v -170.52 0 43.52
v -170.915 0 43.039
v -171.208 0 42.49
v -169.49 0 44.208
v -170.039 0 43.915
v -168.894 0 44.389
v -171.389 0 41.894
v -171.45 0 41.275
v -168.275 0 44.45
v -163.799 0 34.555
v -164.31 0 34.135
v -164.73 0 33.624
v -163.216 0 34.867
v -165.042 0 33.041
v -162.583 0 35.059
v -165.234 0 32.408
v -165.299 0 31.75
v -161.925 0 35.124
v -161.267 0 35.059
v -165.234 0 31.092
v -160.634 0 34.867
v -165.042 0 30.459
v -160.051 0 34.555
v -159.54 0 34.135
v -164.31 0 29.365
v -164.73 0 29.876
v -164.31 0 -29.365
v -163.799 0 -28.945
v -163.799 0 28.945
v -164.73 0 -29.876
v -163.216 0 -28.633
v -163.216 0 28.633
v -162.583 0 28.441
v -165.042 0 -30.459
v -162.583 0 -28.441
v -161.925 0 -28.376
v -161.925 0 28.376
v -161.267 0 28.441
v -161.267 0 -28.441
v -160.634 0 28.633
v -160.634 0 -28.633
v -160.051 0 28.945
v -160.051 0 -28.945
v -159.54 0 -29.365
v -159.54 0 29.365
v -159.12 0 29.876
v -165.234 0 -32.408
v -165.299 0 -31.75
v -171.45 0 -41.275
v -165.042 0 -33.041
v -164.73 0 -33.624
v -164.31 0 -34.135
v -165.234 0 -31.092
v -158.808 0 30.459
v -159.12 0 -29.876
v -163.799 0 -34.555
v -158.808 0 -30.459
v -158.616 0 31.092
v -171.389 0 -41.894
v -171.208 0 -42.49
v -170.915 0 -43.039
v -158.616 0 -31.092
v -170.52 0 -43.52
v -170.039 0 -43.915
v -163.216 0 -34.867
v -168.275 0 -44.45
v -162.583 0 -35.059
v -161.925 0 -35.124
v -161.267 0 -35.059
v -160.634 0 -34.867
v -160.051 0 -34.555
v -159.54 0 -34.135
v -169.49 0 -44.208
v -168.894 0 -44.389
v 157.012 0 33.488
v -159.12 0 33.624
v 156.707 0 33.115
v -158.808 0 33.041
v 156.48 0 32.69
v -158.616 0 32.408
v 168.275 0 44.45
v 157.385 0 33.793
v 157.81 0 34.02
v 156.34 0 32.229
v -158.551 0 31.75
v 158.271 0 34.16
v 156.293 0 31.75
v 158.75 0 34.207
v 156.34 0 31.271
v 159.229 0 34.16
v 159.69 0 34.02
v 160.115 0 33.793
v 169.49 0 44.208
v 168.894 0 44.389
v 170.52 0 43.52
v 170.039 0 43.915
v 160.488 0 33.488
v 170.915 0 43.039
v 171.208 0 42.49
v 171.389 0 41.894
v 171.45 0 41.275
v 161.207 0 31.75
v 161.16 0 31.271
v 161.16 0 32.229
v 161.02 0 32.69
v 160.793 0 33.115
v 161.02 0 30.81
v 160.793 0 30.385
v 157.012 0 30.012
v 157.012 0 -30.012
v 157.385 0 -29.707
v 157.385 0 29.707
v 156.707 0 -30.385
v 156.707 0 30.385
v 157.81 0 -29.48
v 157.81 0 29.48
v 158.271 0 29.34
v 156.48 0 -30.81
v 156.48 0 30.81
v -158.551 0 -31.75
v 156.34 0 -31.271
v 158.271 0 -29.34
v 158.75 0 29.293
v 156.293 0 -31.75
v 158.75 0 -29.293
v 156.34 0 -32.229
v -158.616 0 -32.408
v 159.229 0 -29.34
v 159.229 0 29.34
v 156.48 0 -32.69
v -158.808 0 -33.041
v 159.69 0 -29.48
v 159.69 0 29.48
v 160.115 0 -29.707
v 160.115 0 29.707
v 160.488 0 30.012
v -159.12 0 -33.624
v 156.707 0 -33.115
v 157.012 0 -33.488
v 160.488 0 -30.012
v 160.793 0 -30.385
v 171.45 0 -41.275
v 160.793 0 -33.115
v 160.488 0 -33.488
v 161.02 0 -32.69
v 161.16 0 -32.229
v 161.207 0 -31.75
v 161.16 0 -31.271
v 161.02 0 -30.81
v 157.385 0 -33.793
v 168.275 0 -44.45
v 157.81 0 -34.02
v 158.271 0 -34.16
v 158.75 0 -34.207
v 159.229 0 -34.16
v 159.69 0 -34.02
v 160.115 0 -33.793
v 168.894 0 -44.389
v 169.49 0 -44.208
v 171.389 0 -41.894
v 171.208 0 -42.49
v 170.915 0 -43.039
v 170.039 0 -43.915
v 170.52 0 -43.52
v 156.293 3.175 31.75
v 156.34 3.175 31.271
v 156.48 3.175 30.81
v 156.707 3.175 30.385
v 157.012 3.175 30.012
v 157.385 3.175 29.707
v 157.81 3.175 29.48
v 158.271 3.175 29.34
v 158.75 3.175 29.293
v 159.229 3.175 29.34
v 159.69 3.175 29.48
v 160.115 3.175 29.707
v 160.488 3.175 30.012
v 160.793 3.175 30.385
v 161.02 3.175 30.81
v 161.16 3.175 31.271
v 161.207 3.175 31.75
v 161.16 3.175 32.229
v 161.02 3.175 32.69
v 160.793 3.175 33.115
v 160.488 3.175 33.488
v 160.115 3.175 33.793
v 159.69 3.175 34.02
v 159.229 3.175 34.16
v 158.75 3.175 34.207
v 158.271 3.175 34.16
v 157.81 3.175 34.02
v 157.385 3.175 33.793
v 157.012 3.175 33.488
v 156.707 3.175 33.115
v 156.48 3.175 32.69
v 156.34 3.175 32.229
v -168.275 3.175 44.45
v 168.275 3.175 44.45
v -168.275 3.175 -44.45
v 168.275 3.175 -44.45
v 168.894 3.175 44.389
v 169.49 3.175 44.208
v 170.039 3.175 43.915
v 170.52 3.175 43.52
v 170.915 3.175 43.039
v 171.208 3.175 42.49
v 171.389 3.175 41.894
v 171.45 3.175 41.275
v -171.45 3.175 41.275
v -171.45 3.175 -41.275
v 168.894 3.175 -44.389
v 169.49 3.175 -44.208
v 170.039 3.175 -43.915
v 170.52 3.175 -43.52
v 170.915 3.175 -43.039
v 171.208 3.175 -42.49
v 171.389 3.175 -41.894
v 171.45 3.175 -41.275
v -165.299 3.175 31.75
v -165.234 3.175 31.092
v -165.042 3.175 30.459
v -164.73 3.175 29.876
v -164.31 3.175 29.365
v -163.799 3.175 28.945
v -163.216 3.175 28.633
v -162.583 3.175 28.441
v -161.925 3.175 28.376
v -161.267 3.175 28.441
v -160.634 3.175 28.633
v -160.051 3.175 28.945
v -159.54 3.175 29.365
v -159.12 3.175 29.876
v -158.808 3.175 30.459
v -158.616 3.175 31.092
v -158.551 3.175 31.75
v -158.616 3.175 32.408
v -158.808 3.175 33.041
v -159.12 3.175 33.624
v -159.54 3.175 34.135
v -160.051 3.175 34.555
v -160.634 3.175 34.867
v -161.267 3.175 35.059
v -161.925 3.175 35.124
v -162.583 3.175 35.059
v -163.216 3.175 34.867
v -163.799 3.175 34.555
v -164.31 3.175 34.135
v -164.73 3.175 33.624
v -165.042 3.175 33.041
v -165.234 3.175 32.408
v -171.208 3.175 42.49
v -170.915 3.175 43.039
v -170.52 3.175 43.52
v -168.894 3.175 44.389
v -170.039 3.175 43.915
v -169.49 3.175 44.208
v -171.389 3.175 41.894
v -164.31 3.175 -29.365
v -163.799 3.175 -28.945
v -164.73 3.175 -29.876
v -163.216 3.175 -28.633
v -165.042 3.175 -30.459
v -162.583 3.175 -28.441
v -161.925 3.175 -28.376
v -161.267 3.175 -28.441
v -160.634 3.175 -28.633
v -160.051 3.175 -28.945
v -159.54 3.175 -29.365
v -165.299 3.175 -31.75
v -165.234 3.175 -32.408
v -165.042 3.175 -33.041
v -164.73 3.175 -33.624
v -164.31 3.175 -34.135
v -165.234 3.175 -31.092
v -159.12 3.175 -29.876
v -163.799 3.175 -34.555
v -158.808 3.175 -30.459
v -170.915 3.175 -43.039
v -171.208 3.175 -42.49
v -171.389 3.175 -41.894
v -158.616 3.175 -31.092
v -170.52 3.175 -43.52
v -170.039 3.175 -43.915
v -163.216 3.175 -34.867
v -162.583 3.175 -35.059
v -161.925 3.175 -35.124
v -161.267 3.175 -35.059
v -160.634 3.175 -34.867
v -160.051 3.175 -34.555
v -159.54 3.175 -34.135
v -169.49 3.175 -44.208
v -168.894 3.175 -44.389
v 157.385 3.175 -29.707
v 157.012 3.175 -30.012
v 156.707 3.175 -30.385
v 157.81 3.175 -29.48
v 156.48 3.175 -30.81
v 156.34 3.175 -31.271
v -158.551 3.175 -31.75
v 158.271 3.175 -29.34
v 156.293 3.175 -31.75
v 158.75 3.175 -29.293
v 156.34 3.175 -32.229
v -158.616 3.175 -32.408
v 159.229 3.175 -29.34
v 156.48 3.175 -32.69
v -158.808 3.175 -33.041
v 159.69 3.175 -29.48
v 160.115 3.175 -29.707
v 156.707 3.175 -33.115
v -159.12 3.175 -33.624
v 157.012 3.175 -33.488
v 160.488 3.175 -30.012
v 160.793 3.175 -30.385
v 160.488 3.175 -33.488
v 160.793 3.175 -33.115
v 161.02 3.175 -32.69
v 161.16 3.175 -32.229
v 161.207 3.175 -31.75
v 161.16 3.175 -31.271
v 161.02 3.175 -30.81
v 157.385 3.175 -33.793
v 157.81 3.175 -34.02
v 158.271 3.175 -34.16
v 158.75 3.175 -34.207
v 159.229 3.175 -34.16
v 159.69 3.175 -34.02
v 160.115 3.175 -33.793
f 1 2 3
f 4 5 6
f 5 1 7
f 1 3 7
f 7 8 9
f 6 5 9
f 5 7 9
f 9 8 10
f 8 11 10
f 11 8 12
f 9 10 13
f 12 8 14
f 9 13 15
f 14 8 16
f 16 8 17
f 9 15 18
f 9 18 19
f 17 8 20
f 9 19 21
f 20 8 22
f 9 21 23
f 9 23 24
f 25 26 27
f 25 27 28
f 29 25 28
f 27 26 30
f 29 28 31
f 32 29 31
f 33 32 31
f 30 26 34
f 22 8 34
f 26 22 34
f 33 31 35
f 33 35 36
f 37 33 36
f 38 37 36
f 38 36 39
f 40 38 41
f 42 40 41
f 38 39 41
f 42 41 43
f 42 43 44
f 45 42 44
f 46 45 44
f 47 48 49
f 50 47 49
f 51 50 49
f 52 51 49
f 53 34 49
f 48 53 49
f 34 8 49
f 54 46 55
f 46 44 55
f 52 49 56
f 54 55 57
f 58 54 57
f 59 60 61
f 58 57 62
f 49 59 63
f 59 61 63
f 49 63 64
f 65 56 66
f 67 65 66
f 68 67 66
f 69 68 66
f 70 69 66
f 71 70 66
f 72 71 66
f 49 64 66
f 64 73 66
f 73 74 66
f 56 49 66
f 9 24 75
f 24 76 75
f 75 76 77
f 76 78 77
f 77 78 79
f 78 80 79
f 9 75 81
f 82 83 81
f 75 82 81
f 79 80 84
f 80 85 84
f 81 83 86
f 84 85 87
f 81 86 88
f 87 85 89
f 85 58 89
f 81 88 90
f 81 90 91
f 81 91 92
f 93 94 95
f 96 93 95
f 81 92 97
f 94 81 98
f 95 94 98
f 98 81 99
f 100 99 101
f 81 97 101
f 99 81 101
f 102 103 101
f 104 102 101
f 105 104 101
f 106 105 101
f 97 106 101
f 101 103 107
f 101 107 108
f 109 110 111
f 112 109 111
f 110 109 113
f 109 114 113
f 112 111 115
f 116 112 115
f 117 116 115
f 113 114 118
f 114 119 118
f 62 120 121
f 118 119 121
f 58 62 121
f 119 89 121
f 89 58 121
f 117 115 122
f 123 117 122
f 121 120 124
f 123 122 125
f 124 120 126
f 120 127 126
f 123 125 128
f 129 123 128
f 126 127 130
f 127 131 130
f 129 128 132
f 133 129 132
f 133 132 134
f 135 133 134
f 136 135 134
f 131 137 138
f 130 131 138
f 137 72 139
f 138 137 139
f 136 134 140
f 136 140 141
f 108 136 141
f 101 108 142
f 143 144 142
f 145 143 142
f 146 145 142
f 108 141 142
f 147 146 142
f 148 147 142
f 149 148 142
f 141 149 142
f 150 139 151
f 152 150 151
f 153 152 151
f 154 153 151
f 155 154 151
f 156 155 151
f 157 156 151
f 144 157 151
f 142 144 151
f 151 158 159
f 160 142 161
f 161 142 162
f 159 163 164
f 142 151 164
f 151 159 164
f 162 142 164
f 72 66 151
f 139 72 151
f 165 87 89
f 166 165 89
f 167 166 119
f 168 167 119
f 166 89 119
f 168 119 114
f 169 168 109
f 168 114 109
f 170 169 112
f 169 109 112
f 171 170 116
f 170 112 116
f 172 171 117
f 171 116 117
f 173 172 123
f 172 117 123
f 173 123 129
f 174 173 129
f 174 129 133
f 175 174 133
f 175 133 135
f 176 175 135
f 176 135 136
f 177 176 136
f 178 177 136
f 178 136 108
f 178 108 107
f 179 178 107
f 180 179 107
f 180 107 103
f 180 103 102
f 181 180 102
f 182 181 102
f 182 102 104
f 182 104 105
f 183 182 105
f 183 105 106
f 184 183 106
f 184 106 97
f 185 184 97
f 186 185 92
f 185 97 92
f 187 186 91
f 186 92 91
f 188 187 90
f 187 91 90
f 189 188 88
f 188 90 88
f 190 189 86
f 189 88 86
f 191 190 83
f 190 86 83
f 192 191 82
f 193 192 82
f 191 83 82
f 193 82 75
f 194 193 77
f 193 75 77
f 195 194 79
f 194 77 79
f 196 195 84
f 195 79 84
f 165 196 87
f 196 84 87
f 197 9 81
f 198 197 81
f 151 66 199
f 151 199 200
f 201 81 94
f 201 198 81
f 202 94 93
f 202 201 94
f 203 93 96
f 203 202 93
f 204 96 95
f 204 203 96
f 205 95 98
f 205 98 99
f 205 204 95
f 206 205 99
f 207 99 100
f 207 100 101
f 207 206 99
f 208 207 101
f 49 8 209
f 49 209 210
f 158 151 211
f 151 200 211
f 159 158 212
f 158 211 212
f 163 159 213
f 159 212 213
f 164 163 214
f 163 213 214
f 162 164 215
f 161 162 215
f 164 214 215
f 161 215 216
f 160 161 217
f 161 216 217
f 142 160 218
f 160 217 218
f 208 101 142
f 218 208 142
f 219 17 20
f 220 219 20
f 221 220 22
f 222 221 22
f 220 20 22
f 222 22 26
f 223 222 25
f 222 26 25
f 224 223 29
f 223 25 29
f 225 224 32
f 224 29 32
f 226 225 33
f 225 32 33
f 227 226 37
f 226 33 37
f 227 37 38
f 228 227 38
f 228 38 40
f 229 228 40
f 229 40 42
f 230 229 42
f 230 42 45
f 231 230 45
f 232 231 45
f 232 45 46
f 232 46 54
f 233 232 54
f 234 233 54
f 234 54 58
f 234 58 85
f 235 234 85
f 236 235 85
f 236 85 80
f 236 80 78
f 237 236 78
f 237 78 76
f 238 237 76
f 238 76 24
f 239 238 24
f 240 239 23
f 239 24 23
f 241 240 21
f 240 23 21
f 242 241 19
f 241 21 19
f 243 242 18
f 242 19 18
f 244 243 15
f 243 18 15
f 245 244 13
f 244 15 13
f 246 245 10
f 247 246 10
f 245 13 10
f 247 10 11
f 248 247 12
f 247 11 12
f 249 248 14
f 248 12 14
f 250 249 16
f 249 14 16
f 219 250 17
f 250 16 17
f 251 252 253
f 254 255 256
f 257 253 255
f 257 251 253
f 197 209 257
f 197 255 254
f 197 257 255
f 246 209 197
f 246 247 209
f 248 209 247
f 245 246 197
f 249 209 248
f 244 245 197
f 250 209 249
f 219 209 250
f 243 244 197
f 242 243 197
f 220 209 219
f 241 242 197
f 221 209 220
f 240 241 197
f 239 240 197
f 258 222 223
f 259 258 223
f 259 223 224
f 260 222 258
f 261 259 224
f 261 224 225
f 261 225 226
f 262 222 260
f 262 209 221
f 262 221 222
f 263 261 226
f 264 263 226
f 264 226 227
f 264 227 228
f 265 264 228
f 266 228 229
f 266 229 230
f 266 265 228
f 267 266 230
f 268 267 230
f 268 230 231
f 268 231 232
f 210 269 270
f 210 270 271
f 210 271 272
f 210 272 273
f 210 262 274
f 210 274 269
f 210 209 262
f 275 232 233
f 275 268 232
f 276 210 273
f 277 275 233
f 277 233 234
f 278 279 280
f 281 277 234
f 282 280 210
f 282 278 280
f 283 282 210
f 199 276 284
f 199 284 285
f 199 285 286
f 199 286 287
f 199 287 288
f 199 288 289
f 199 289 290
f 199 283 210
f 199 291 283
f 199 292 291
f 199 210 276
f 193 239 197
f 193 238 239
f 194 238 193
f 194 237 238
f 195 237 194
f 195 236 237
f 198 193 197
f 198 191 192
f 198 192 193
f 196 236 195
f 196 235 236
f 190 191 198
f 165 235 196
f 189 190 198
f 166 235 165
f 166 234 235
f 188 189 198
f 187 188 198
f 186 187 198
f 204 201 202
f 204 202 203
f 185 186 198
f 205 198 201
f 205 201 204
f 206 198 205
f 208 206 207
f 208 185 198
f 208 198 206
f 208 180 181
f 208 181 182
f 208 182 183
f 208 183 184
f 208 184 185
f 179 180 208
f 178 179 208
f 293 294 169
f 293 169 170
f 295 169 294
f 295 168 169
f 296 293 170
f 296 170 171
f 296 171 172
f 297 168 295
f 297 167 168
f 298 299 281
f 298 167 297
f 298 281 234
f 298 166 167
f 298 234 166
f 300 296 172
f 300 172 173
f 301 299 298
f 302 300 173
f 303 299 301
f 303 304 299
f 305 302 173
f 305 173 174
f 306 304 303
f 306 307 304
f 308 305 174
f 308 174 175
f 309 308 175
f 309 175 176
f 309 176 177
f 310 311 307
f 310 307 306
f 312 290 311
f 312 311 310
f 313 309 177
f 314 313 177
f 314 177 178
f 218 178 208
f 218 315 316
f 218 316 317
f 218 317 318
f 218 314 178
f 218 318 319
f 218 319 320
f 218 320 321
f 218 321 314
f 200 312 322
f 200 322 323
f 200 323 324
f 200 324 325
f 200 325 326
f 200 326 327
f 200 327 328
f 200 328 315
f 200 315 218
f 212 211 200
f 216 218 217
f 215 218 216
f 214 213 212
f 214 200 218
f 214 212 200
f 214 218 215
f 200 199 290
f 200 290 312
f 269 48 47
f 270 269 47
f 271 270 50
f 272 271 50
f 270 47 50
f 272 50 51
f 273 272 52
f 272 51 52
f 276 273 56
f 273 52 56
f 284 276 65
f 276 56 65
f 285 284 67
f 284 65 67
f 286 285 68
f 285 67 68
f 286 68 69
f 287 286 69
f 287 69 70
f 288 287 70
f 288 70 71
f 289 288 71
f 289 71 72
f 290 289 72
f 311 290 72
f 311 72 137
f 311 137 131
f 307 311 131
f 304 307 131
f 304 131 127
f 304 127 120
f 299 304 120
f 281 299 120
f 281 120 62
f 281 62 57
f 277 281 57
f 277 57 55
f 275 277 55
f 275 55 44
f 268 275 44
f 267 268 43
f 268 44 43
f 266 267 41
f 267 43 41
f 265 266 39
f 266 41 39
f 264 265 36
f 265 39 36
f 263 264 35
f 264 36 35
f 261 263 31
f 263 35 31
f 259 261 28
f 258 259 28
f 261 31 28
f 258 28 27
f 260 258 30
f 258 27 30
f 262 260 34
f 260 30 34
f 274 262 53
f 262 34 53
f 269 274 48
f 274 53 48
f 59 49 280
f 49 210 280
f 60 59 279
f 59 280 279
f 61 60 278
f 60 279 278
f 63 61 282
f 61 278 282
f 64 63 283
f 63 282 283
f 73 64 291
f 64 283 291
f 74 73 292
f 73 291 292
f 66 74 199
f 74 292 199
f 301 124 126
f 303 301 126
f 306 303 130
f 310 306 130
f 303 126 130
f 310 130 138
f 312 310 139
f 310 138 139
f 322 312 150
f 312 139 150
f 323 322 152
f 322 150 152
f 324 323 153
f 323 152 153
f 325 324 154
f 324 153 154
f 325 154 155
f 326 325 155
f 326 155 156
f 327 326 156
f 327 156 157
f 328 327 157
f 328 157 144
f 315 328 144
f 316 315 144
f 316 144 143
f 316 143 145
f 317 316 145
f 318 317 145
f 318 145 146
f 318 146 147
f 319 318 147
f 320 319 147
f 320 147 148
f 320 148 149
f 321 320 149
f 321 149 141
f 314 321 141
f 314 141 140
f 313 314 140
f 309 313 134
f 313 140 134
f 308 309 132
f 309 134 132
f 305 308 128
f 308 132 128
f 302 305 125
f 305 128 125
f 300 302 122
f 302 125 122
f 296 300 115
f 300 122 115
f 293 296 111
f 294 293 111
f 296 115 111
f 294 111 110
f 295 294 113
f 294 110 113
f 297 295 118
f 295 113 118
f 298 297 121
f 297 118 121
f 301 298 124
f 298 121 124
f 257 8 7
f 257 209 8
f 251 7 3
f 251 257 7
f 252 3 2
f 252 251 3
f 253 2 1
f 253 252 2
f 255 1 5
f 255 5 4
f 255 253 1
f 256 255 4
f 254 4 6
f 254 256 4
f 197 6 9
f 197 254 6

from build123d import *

# Parameters (mm, degrees)
SKETCH1_W                        = 342.9
SKETCH1_H                        = 88.9
BOSS_EXTRUDE1_DEPTH              = 3.175
F_17_64_0_26563_DIAMETER_HOLE1_D = 6.747002
F_10_0_1935_DIAMETER_HOLE1_D     = 4.9149
FILLET1_R                        = 3.175


with BuildPart() as part:
    # Sketch1 → Boss-Extrude1 (new body)
    with BuildSketch(Plane(origin=(0, 0, 0), x_dir=(1, 0, 0), z_dir=(0, 1, 0))):
        Rectangle(SKETCH1_W, SKETCH1_H)
    extrude(amount=BOSS_EXTRUDE1_DEPTH)

    # 17/64 (0.26563) Diameter Hole1 (through all)
    with Locations(Plane(origin=(0, 3.175, 0), x_dir=(1, 0, 0), z_dir=(0, 1, 0))):
        with Locations((-161.925, 31.75), (-161.925, -31.75)):
            Hole(F_17_64_0_26563_DIAMETER_HOLE1_D / 2)

    # #10 (0.1935) Diameter Hole1 (through all)
    with Locations(Plane(origin=(0, 3.175, 0), x_dir=(1, 0, 0), z_dir=(0, 1, 0))):
        with Locations((158.75, 31.75), (158.75, -31.75)):
            Hole(F_10_0_1935_DIAMETER_HOLE1_D / 2)

    # Fillet1
    fillet1_edges = [part.edges().sort_by_distance(p)[0] for p in [
        (171.45, 1.5875, 44.45),
        (-171.45, 1.5875, 44.45),
        (-171.45, 1.5875, -44.45),
        (171.45, 1.5875, -44.45),
    ]]
    fillet(fillet1_edges, radius=FILLET1_R)


solid = part.part
